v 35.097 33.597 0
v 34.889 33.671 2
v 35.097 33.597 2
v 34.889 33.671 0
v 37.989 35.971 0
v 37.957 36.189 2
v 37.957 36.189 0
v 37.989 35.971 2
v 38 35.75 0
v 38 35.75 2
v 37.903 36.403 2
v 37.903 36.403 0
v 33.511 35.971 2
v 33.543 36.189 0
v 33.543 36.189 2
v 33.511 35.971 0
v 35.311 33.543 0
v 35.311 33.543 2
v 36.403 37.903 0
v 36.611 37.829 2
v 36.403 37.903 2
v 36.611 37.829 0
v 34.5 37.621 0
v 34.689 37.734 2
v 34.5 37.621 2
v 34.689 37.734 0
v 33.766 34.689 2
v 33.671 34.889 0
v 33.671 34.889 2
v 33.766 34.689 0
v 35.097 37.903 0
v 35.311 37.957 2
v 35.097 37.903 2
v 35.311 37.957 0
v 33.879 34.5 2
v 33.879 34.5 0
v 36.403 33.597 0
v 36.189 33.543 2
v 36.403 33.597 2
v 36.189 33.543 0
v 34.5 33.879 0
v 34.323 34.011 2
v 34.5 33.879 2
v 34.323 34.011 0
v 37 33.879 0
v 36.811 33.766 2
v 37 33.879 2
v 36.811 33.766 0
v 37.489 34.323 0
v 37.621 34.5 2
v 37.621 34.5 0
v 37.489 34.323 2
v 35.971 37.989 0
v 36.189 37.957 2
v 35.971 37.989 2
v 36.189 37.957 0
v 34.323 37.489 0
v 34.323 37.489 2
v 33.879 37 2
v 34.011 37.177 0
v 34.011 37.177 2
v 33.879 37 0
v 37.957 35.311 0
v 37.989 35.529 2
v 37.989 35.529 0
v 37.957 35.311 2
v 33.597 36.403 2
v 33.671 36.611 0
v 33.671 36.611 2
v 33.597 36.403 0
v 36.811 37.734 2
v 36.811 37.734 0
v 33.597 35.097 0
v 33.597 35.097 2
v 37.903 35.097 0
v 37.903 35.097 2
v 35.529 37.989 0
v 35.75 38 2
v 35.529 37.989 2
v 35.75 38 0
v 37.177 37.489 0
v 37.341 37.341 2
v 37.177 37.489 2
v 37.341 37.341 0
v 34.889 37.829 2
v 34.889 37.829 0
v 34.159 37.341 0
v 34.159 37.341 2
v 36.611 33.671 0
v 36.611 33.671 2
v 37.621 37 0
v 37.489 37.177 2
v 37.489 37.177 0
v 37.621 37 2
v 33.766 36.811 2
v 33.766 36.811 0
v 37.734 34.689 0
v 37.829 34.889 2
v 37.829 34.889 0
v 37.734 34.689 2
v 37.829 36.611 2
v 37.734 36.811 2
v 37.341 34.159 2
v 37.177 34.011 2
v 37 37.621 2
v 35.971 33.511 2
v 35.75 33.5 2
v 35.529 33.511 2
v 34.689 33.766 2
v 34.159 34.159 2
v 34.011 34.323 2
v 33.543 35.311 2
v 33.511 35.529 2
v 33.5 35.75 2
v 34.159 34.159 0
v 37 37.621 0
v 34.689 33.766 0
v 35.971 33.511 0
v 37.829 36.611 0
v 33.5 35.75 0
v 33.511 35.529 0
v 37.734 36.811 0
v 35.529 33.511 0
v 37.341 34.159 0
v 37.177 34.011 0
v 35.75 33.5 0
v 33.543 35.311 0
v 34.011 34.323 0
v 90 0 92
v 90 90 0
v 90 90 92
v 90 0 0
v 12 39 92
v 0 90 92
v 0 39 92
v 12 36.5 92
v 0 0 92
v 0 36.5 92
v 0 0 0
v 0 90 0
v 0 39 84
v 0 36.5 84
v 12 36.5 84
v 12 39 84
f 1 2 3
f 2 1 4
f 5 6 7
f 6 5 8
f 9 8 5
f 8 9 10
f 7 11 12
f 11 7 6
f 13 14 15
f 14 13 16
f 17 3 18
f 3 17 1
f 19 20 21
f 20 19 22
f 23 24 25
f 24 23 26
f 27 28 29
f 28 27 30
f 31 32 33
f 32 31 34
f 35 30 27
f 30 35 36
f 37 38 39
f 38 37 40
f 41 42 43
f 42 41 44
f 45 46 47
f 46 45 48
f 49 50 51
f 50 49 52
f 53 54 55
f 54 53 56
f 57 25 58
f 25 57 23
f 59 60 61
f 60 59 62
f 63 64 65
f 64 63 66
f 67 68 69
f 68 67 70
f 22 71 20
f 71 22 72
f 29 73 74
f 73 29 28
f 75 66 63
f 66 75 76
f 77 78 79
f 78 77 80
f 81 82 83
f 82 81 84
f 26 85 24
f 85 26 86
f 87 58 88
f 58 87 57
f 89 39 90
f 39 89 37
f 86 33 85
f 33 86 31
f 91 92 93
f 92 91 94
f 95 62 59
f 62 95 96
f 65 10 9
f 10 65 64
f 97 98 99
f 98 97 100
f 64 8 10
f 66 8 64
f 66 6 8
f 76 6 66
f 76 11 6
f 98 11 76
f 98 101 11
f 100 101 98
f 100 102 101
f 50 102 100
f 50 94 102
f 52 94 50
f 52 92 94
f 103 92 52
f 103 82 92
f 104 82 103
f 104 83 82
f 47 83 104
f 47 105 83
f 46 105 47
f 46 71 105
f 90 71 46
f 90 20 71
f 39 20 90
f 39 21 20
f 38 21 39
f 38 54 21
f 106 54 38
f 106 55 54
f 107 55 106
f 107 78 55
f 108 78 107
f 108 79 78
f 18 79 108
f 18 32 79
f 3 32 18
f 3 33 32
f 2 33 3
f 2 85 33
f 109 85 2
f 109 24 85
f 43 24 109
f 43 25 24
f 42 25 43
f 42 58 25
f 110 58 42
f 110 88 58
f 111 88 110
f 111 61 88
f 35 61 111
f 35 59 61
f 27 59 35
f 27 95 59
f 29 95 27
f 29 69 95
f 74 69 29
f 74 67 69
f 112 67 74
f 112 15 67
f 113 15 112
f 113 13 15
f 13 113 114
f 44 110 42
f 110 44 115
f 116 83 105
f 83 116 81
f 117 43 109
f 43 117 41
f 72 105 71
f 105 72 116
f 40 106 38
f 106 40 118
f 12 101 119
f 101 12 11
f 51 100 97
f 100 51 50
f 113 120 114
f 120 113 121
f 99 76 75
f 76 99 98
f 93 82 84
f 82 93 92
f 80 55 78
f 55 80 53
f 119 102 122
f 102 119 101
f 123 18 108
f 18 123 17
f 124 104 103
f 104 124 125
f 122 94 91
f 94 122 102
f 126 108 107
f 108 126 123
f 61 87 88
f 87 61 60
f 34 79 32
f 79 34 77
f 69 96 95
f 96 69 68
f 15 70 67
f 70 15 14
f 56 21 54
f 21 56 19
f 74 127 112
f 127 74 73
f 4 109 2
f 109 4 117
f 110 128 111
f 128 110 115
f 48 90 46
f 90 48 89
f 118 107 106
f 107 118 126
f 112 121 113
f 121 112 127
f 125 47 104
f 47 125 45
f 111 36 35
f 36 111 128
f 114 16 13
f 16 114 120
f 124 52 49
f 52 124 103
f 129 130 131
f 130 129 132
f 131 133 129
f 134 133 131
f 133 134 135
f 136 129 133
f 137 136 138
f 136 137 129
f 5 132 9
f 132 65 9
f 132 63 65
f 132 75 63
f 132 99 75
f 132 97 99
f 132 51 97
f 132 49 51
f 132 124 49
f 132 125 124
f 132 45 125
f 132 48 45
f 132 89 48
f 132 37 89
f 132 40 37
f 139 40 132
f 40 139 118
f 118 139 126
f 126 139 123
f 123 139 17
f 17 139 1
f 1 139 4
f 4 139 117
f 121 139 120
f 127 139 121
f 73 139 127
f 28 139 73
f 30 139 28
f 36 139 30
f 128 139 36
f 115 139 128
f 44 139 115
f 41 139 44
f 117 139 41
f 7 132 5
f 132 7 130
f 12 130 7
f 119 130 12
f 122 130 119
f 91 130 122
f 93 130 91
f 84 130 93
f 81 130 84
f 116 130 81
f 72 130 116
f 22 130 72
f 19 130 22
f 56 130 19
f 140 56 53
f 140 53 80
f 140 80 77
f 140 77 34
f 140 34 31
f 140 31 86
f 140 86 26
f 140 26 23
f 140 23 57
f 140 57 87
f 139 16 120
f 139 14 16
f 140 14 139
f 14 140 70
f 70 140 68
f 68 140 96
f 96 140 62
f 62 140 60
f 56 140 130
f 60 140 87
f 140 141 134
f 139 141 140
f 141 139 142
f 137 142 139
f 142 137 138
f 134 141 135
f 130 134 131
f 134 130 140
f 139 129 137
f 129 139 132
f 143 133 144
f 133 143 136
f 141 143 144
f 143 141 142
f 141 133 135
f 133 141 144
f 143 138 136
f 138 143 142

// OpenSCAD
// DIY Magnetic Stirrer Housing for 80mm PC Fan
// Print Orientation: Upside down. Top plate on bed (Z=0), walls rise to Z=40.

// --- Dimensions ---
// Outer size of the box
W = 90;
H = 90;
D = 90; // Depth (Z height of walls)

// Wall thickness
T_WALL = 2.5;

// Top plate thickness
T_TOP = 2;

// Total height of the part (Top plate + Walls)
Z_MAX = T_TOP + D;

// Fan mounting hole pattern
// 71.5 mm square pattern centred on the plate
PATTERN_SIZE = 71.5;
// Hole diameter for M4 screws
D_HOLE = 4.5;

// Cable notch dimensions
NOTCH_W = 12;
NOTCH_Y = (H - NOTCH_W) / 2; // Center Y position
NOTCH_DEPTH = 8; // Depth from open edge (Z = 32 to 40)

// --- Configuration ---
$fn = 128; // High resolution for smooth curves and accurate holes

// --- Main Body Construction ---
// We build the solid from the bottom up.
// 1. Create the base block (Top plate + Walls)
// 2. Cut the screw holes through the top plate.
// 3. Cut the cable notch in one wall.

difference() {
    // 1. The Main Block
    // Outer dimensions: W x H x Z_MAX
    // We subtract the wall thickness from the outer dimensions to get the inner void
    // Inner X = W - 2*T_WALL
    // Inner Y = H - 2*T_WALL
    // Inner Z = Z_MAX - T_WALL (since the top is open)
    
    cube([W, H, Z_MAX], center = false);
    
    // 2. Screw Holes
    // Pattern: 71.5mm square centered on the plate.
    // The plate is at Z=0 to Z=2.
    // We need to cut through the top plate only.
    // To ensure clean cutting, we extend the cutter slightly past the plate thickness.
    
    for (i = [-1, 1]) {
        for (j = [-1, 1]) {
            // Calculate position based on pattern size
            // Center is 0,0. Half pattern size is PATTERN_SIZE/2
            // Offset by i and j to get the four corners of the square pattern
            x_pos = (PATTERN_SIZE / 2) * i;
            y_pos = (PATTERN_SIZE / 2) * j;
            
            // Cylinder cutter
            // Extend 0.1mm past the top plate (Z=2) to ensure full cut
            translate([x_pos, y_pos, -0.1]) 
                cylinder(h = T_TOP + 0.1, d = D_HOLE, $fn = 64);
        }
    }
    
    // 3. Cable Notch
    // Location: One wall. Let's choose the front wall (Y = H/2 - T_WALL).
    // Dimensions: 12mm wide, centered along the wall.
    // Depth: 8mm down from the open edge.
    // Open edge is at Z = Z_MAX. So notch goes from Z = Z_MAX - 8 to Z = Z_MAX.
    
    // Wall position (Front wall)
    wall_y = H/2 - T_WALL;
    
    // Notch geometry
    // Width: NOTCH_W
    // Height (Z): NOTCH_DEPTH
    // Y position: Centered on the wall face.
    // The wall face is at Y = wall_y. The notch goes inward (negative Y direction).
    // Center of notch in Y relative to the wall face:
    notch_y_center = NOTCH_W / 2;
    
    // Create the notch cutter
    // It needs to be tall enough to cut through the wall thickness
    translate([0, wall_y - notch_y_center, Z_MAX - NOTCH_DEPTH])
        cube([NOTCH_W, T_WALL, NOTCH_DEPTH]);
}
